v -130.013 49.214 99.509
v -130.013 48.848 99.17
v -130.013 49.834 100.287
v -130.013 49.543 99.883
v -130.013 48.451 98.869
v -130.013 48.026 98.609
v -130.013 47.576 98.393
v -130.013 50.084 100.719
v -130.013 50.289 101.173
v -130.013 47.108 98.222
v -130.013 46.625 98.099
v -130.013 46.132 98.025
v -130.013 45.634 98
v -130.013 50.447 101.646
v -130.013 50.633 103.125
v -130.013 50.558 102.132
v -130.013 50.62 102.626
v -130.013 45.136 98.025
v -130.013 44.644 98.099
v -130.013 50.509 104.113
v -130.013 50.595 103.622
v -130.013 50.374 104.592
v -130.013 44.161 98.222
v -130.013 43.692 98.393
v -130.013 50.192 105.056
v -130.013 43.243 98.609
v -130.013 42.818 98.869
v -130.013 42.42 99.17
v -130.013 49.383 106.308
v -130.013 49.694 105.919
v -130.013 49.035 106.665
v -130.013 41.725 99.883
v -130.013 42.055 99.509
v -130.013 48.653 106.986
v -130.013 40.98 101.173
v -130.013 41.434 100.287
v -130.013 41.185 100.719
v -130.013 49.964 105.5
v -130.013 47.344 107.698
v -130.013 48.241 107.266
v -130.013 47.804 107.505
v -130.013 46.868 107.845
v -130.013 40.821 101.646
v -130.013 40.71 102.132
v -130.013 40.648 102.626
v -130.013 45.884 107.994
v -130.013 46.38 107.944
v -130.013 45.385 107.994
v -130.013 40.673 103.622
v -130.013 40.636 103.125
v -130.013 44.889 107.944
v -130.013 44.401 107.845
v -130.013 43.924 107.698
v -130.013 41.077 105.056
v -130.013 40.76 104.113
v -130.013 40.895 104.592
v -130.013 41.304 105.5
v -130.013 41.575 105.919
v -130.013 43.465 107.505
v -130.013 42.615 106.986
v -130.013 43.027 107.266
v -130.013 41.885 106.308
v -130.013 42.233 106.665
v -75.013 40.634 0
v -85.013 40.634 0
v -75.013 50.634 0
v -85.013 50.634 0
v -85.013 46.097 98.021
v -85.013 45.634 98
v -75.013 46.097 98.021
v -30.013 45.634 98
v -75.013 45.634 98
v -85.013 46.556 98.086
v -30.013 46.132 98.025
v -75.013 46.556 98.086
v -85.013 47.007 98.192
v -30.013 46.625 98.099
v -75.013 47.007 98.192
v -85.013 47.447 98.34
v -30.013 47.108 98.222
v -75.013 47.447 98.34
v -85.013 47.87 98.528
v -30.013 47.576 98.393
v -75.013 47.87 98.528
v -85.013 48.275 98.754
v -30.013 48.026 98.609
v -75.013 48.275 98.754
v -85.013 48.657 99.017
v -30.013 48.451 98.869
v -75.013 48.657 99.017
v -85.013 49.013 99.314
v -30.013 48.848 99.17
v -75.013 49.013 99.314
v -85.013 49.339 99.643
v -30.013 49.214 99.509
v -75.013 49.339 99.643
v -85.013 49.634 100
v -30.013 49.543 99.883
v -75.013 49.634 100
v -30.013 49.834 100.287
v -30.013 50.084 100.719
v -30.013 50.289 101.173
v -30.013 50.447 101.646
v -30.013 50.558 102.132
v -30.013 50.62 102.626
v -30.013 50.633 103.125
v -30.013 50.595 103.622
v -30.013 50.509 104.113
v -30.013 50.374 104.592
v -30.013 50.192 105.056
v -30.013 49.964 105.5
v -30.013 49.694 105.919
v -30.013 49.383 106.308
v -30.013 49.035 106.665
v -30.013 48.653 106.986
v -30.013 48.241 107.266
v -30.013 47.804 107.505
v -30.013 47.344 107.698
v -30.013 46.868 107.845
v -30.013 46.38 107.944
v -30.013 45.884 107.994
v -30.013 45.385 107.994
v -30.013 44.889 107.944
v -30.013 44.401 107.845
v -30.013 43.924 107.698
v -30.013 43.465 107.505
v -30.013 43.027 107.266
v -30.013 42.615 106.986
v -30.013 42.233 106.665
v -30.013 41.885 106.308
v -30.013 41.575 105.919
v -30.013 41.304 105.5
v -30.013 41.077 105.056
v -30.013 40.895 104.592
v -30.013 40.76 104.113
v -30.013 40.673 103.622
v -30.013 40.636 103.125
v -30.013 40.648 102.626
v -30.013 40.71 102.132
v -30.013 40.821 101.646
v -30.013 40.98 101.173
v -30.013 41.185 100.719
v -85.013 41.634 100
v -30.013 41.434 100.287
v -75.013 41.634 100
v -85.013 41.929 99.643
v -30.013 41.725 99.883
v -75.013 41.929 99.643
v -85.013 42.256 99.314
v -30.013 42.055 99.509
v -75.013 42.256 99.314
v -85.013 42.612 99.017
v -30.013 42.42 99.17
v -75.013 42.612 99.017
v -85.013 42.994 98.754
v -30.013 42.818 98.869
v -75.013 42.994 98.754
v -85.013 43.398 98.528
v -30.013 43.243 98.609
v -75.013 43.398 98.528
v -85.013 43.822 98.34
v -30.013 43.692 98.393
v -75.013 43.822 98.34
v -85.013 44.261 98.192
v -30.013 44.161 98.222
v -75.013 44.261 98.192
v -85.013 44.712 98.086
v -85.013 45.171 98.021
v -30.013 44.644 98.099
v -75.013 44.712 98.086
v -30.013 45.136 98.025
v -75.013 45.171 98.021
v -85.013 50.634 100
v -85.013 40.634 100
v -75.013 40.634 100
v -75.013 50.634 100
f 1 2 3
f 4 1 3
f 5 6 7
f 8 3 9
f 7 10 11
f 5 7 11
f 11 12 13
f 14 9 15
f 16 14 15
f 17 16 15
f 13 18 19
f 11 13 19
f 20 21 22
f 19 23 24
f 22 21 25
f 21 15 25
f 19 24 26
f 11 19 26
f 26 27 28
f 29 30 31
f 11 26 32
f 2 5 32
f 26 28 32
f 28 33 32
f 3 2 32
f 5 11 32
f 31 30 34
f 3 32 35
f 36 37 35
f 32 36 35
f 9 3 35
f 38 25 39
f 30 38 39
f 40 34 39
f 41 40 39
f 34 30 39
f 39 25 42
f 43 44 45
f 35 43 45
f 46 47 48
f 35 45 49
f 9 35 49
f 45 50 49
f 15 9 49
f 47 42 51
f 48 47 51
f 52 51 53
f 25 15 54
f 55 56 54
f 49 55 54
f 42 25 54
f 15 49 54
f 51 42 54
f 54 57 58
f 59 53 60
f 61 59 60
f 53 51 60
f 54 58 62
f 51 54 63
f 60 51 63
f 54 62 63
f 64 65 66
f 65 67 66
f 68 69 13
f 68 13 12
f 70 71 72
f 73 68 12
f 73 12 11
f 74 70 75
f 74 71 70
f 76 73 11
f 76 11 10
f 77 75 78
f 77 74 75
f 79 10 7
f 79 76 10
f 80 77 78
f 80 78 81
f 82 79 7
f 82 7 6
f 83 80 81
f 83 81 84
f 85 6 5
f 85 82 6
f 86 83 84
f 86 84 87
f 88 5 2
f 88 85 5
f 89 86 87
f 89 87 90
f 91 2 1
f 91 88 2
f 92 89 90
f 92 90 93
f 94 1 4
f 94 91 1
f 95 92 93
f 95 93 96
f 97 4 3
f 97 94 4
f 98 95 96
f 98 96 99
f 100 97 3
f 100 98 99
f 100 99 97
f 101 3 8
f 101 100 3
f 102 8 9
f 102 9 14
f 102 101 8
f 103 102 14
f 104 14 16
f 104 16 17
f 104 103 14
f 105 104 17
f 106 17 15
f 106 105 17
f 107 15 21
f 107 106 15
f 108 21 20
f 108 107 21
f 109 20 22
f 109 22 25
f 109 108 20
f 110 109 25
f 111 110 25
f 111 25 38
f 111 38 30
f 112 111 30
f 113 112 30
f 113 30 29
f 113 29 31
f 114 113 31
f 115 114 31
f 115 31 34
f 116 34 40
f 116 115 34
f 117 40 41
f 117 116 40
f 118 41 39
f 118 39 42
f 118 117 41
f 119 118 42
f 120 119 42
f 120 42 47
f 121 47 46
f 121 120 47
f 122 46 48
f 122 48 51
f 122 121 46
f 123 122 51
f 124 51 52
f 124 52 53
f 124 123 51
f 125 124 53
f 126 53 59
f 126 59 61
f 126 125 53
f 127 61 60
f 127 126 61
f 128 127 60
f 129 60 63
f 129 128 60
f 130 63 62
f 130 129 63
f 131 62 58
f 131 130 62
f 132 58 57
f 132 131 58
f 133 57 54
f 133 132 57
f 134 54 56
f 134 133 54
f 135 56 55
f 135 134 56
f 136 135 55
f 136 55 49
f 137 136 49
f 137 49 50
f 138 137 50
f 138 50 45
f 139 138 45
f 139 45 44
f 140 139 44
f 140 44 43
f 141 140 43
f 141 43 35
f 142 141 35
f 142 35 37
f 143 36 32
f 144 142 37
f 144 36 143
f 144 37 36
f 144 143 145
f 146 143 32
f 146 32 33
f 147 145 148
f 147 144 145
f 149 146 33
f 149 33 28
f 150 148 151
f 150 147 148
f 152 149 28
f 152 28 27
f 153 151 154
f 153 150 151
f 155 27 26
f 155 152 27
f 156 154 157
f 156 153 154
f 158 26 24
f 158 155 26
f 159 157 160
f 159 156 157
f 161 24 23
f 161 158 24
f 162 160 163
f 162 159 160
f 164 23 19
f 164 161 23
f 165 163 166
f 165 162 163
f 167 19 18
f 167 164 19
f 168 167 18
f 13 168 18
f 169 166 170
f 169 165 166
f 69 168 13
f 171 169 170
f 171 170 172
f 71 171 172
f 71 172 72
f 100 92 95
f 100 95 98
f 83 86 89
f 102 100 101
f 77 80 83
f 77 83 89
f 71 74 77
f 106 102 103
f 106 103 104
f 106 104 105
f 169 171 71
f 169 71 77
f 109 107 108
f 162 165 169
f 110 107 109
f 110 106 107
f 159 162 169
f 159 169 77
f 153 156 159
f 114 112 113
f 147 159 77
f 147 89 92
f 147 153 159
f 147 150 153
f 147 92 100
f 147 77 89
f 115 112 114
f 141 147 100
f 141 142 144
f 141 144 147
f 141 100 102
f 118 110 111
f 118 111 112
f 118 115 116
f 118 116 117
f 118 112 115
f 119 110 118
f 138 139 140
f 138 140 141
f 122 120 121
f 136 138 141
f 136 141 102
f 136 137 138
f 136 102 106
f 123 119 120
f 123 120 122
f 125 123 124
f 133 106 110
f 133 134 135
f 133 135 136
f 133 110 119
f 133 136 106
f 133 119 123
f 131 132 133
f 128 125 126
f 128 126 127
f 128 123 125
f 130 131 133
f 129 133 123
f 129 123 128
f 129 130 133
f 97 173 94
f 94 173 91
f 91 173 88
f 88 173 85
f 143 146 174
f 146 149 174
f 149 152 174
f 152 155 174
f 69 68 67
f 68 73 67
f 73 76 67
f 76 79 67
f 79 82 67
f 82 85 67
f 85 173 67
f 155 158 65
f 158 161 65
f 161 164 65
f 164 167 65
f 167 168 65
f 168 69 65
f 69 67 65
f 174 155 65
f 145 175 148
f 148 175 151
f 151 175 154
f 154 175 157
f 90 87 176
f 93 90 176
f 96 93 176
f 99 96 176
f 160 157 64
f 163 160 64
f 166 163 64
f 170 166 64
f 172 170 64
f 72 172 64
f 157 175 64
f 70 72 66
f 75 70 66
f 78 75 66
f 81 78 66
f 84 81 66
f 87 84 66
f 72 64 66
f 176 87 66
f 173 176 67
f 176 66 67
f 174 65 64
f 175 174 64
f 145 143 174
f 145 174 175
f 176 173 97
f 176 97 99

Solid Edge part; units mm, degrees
sketch "Sketch1" plane through (0, 0, 0) normal (0, 0, 1) x (1, 0, 0)
  line L0 (-85.0132, 40.6343) -> (-75.0132, 40.6343)
  line L1 (-75.0132, 40.6343) -> (-75.0132, 50.6343)
  line L2 (-75.0132, 50.6343) -> (-85.0132, 50.6343)
  line L3 (-85.0132, 50.6343) -> (-85.0132, 40.6343)
  dimension "D1" = 10
  dimension "D2" = 10
extrude "Protrusion1" add sketch "Sketch1" along normal blind 100
sketch "Sketch2" plane through (-30.0132, 45.6343, 50) normal (1, 0, 0) x (0, 0, -1)
  circle A0 centre (-53, 0) radius 5
  dimension "D1" = 3
extrude "ExtrudedProtrusion_2" add sketch "Sketch2" against normal blind 100
